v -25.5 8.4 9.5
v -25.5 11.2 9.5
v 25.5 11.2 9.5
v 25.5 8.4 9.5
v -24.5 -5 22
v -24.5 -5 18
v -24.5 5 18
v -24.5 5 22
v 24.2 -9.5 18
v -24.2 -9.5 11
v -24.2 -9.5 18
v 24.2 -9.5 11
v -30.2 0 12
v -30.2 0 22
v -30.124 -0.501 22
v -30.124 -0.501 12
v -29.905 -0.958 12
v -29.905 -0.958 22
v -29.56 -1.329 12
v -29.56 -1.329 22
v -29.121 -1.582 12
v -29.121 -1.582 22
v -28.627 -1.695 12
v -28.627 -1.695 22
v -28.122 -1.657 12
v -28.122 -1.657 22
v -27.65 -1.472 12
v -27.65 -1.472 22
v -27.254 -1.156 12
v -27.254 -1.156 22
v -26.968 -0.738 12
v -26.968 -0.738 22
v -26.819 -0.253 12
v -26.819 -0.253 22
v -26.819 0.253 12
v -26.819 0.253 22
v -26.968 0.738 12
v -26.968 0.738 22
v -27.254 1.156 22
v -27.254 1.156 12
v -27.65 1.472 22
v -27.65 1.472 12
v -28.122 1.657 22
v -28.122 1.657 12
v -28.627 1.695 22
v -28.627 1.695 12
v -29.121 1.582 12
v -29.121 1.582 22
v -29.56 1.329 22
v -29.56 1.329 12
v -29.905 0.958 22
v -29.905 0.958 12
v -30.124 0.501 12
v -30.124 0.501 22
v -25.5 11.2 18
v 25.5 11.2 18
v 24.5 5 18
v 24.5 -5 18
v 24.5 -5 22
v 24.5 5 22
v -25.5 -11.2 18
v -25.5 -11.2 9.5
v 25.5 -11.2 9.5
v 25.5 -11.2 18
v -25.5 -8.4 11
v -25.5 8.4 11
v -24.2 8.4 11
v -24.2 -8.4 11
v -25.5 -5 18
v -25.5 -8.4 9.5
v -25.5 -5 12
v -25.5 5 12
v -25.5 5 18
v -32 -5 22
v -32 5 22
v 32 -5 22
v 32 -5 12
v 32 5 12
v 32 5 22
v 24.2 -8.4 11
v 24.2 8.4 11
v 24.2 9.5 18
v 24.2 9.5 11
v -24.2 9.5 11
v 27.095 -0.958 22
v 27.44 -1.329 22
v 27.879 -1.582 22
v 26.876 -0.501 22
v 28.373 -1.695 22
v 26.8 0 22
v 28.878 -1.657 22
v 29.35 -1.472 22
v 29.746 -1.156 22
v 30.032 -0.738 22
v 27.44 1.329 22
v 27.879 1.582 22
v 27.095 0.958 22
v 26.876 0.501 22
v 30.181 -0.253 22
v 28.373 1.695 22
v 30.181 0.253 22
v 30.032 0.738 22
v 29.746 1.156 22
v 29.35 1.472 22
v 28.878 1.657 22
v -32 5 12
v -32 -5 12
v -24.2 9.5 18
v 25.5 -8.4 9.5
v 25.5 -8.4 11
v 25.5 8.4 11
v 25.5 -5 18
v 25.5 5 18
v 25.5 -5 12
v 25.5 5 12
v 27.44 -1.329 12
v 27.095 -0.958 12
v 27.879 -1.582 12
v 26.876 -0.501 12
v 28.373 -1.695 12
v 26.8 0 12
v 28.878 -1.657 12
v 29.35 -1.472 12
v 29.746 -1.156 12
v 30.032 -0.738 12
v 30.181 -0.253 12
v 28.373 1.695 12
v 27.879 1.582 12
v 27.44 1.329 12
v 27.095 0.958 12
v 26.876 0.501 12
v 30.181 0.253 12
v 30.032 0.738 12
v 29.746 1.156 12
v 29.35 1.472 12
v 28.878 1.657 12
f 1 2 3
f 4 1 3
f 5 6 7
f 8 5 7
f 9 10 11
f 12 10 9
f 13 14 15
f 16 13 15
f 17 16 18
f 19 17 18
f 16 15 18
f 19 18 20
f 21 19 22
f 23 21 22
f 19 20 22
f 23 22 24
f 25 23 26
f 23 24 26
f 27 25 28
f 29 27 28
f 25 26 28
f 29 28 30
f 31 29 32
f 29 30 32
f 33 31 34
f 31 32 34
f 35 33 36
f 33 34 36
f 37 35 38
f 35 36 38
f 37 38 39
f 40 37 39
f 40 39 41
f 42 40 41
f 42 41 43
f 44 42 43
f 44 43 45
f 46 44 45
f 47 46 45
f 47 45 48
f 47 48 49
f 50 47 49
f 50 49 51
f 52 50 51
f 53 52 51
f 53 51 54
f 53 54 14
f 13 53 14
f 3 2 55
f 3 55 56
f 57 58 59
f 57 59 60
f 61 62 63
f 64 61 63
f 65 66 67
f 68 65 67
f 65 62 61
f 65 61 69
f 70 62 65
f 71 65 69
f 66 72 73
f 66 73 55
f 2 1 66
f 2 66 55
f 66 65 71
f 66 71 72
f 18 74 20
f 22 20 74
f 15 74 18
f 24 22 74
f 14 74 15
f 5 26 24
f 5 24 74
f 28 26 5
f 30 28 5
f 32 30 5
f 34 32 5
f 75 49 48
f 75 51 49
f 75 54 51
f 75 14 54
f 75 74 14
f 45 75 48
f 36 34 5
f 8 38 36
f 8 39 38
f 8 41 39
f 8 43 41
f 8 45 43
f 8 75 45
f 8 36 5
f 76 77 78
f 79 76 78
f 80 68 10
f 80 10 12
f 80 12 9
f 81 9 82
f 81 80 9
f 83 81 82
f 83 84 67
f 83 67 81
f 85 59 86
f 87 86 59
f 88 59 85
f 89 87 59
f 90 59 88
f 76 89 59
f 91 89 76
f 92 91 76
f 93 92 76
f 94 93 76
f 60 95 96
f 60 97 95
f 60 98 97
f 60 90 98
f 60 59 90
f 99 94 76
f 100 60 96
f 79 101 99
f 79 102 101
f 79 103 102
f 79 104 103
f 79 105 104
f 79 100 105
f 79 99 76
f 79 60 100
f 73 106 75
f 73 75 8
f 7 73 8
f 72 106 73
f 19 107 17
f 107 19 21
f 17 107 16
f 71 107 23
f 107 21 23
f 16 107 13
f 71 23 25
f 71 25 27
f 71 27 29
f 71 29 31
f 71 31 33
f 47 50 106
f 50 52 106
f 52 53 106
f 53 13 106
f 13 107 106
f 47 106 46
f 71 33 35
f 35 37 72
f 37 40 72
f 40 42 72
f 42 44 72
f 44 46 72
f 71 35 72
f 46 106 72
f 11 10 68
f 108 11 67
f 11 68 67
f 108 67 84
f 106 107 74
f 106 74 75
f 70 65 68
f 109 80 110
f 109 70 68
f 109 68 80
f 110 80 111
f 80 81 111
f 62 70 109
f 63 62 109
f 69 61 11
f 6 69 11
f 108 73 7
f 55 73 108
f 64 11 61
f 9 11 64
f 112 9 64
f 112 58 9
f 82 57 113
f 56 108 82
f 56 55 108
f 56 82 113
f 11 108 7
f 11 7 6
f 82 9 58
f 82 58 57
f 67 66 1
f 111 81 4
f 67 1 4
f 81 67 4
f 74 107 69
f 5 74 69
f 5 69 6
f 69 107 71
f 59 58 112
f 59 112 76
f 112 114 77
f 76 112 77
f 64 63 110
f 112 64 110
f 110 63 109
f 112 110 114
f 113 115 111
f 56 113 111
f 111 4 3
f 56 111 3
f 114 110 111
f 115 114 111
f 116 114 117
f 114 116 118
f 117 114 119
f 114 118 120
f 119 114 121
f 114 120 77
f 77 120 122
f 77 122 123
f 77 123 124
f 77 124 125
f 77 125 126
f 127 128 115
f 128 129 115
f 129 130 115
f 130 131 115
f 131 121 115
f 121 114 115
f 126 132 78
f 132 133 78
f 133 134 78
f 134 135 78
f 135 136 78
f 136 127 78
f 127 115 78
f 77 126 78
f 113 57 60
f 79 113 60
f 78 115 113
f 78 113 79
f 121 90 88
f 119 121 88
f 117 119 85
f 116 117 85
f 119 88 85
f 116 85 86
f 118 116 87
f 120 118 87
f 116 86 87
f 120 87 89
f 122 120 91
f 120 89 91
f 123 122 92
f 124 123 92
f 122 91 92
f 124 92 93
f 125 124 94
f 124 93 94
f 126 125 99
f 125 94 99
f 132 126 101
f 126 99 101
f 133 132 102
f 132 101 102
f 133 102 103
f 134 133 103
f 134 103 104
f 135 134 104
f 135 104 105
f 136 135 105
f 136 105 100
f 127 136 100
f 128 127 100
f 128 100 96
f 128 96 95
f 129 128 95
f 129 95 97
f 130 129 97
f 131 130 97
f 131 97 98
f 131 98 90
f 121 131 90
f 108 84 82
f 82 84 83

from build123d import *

# Parameters (mm, degrees)
GRAY_HOUSING_PERIMETER_RETENTION_START = 11
SKETCH_1_W                             = 51
SKETCH_1_H                             = 22.4
SKETCH_1_W_2                           = 48.4
SKETCH_1_H_2                           = 19
GRAY_HOUSING_PERIMETER_RETENTION_DEPTH = 7
GRAY_LOWER_EDGE_RETAINING_LIPS_START   = 9.5
SKETCH_2_W                             = 51
SKETCH_2_H                             = 2.8
GRAY_LOWER_EDGE_RETAINING_LIPS_DEPTH   = 1.5
GRAY_MOUNTING_ENDS_TO_DECK_START       = 12
SKETCH_5_W                             = 7.5
SKETCH_5_H                             = 10
GRAY_MOUNTING_ENDS_TO_DECK_DEPTH       = 10
GRAY_M3_MOUNTS_START                   = 23
SKETCH_6_R                             = 1.7
GRAY_M3_MOUNTS_DEPTH                   = 12


with BuildPart() as part:
    # 草图1 → Gray_housing_perimeter_retention (new body)
    with BuildSketch(Plane.XY.offset(GRAY_HOUSING_PERIMETER_RETENTION_START)):
        Rectangle(SKETCH_1_W, SKETCH_1_H)
        Rectangle(SKETCH_1_W_2, SKETCH_1_H_2, mode=Mode.SUBTRACT)
    extrude(amount=GRAY_HOUSING_PERIMETER_RETENTION_DEPTH)

    # 草图2 → Gray_lower_edge_retaining_lips (add)
    with BuildSketch(Plane.XY.offset(GRAY_LOWER_EDGE_RETAINING_LIPS_START)):
        with Locations((0, -9.8)):
            Rectangle(SKETCH_2_W, SKETCH_2_H)
        with Locations((0, 9.8)):
            Rectangle(SKETCH_2_W, SKETCH_2_H)
    extrude(amount=GRAY_LOWER_EDGE_RETAINING_LIPS_DEPTH)

    # 草图5 → Gray_mounting_ends_to_deck (add)
    with BuildSketch(Plane.XY.offset(GRAY_MOUNTING_ENDS_TO_DECK_START)):
        with Locations((-28.25, 0)):
            Rectangle(SKETCH_5_W, SKETCH_5_H)
        with Locations((28.25, 0)):
            Rectangle(SKETCH_5_W, SKETCH_5_H)
    extrude(amount=GRAY_MOUNTING_ENDS_TO_DECK_DEPTH)

    # 草图6 → Gray_M3_mounts (cut)
    with BuildSketch(Plane.XY.offset(GRAY_M3_MOUNTS_START)):
        with Locations(Location((-28.5, 0, 0), (0, 0, 180))):
            Circle(SKETCH_6_R)
        with Locations(Location((28.5, 0, 0), (0, 0, 180))):
            Circle(SKETCH_6_R)
    extrude(amount=-GRAY_M3_MOUNTS_DEPTH, mode=Mode.SUBTRACT)


solid = part.part
